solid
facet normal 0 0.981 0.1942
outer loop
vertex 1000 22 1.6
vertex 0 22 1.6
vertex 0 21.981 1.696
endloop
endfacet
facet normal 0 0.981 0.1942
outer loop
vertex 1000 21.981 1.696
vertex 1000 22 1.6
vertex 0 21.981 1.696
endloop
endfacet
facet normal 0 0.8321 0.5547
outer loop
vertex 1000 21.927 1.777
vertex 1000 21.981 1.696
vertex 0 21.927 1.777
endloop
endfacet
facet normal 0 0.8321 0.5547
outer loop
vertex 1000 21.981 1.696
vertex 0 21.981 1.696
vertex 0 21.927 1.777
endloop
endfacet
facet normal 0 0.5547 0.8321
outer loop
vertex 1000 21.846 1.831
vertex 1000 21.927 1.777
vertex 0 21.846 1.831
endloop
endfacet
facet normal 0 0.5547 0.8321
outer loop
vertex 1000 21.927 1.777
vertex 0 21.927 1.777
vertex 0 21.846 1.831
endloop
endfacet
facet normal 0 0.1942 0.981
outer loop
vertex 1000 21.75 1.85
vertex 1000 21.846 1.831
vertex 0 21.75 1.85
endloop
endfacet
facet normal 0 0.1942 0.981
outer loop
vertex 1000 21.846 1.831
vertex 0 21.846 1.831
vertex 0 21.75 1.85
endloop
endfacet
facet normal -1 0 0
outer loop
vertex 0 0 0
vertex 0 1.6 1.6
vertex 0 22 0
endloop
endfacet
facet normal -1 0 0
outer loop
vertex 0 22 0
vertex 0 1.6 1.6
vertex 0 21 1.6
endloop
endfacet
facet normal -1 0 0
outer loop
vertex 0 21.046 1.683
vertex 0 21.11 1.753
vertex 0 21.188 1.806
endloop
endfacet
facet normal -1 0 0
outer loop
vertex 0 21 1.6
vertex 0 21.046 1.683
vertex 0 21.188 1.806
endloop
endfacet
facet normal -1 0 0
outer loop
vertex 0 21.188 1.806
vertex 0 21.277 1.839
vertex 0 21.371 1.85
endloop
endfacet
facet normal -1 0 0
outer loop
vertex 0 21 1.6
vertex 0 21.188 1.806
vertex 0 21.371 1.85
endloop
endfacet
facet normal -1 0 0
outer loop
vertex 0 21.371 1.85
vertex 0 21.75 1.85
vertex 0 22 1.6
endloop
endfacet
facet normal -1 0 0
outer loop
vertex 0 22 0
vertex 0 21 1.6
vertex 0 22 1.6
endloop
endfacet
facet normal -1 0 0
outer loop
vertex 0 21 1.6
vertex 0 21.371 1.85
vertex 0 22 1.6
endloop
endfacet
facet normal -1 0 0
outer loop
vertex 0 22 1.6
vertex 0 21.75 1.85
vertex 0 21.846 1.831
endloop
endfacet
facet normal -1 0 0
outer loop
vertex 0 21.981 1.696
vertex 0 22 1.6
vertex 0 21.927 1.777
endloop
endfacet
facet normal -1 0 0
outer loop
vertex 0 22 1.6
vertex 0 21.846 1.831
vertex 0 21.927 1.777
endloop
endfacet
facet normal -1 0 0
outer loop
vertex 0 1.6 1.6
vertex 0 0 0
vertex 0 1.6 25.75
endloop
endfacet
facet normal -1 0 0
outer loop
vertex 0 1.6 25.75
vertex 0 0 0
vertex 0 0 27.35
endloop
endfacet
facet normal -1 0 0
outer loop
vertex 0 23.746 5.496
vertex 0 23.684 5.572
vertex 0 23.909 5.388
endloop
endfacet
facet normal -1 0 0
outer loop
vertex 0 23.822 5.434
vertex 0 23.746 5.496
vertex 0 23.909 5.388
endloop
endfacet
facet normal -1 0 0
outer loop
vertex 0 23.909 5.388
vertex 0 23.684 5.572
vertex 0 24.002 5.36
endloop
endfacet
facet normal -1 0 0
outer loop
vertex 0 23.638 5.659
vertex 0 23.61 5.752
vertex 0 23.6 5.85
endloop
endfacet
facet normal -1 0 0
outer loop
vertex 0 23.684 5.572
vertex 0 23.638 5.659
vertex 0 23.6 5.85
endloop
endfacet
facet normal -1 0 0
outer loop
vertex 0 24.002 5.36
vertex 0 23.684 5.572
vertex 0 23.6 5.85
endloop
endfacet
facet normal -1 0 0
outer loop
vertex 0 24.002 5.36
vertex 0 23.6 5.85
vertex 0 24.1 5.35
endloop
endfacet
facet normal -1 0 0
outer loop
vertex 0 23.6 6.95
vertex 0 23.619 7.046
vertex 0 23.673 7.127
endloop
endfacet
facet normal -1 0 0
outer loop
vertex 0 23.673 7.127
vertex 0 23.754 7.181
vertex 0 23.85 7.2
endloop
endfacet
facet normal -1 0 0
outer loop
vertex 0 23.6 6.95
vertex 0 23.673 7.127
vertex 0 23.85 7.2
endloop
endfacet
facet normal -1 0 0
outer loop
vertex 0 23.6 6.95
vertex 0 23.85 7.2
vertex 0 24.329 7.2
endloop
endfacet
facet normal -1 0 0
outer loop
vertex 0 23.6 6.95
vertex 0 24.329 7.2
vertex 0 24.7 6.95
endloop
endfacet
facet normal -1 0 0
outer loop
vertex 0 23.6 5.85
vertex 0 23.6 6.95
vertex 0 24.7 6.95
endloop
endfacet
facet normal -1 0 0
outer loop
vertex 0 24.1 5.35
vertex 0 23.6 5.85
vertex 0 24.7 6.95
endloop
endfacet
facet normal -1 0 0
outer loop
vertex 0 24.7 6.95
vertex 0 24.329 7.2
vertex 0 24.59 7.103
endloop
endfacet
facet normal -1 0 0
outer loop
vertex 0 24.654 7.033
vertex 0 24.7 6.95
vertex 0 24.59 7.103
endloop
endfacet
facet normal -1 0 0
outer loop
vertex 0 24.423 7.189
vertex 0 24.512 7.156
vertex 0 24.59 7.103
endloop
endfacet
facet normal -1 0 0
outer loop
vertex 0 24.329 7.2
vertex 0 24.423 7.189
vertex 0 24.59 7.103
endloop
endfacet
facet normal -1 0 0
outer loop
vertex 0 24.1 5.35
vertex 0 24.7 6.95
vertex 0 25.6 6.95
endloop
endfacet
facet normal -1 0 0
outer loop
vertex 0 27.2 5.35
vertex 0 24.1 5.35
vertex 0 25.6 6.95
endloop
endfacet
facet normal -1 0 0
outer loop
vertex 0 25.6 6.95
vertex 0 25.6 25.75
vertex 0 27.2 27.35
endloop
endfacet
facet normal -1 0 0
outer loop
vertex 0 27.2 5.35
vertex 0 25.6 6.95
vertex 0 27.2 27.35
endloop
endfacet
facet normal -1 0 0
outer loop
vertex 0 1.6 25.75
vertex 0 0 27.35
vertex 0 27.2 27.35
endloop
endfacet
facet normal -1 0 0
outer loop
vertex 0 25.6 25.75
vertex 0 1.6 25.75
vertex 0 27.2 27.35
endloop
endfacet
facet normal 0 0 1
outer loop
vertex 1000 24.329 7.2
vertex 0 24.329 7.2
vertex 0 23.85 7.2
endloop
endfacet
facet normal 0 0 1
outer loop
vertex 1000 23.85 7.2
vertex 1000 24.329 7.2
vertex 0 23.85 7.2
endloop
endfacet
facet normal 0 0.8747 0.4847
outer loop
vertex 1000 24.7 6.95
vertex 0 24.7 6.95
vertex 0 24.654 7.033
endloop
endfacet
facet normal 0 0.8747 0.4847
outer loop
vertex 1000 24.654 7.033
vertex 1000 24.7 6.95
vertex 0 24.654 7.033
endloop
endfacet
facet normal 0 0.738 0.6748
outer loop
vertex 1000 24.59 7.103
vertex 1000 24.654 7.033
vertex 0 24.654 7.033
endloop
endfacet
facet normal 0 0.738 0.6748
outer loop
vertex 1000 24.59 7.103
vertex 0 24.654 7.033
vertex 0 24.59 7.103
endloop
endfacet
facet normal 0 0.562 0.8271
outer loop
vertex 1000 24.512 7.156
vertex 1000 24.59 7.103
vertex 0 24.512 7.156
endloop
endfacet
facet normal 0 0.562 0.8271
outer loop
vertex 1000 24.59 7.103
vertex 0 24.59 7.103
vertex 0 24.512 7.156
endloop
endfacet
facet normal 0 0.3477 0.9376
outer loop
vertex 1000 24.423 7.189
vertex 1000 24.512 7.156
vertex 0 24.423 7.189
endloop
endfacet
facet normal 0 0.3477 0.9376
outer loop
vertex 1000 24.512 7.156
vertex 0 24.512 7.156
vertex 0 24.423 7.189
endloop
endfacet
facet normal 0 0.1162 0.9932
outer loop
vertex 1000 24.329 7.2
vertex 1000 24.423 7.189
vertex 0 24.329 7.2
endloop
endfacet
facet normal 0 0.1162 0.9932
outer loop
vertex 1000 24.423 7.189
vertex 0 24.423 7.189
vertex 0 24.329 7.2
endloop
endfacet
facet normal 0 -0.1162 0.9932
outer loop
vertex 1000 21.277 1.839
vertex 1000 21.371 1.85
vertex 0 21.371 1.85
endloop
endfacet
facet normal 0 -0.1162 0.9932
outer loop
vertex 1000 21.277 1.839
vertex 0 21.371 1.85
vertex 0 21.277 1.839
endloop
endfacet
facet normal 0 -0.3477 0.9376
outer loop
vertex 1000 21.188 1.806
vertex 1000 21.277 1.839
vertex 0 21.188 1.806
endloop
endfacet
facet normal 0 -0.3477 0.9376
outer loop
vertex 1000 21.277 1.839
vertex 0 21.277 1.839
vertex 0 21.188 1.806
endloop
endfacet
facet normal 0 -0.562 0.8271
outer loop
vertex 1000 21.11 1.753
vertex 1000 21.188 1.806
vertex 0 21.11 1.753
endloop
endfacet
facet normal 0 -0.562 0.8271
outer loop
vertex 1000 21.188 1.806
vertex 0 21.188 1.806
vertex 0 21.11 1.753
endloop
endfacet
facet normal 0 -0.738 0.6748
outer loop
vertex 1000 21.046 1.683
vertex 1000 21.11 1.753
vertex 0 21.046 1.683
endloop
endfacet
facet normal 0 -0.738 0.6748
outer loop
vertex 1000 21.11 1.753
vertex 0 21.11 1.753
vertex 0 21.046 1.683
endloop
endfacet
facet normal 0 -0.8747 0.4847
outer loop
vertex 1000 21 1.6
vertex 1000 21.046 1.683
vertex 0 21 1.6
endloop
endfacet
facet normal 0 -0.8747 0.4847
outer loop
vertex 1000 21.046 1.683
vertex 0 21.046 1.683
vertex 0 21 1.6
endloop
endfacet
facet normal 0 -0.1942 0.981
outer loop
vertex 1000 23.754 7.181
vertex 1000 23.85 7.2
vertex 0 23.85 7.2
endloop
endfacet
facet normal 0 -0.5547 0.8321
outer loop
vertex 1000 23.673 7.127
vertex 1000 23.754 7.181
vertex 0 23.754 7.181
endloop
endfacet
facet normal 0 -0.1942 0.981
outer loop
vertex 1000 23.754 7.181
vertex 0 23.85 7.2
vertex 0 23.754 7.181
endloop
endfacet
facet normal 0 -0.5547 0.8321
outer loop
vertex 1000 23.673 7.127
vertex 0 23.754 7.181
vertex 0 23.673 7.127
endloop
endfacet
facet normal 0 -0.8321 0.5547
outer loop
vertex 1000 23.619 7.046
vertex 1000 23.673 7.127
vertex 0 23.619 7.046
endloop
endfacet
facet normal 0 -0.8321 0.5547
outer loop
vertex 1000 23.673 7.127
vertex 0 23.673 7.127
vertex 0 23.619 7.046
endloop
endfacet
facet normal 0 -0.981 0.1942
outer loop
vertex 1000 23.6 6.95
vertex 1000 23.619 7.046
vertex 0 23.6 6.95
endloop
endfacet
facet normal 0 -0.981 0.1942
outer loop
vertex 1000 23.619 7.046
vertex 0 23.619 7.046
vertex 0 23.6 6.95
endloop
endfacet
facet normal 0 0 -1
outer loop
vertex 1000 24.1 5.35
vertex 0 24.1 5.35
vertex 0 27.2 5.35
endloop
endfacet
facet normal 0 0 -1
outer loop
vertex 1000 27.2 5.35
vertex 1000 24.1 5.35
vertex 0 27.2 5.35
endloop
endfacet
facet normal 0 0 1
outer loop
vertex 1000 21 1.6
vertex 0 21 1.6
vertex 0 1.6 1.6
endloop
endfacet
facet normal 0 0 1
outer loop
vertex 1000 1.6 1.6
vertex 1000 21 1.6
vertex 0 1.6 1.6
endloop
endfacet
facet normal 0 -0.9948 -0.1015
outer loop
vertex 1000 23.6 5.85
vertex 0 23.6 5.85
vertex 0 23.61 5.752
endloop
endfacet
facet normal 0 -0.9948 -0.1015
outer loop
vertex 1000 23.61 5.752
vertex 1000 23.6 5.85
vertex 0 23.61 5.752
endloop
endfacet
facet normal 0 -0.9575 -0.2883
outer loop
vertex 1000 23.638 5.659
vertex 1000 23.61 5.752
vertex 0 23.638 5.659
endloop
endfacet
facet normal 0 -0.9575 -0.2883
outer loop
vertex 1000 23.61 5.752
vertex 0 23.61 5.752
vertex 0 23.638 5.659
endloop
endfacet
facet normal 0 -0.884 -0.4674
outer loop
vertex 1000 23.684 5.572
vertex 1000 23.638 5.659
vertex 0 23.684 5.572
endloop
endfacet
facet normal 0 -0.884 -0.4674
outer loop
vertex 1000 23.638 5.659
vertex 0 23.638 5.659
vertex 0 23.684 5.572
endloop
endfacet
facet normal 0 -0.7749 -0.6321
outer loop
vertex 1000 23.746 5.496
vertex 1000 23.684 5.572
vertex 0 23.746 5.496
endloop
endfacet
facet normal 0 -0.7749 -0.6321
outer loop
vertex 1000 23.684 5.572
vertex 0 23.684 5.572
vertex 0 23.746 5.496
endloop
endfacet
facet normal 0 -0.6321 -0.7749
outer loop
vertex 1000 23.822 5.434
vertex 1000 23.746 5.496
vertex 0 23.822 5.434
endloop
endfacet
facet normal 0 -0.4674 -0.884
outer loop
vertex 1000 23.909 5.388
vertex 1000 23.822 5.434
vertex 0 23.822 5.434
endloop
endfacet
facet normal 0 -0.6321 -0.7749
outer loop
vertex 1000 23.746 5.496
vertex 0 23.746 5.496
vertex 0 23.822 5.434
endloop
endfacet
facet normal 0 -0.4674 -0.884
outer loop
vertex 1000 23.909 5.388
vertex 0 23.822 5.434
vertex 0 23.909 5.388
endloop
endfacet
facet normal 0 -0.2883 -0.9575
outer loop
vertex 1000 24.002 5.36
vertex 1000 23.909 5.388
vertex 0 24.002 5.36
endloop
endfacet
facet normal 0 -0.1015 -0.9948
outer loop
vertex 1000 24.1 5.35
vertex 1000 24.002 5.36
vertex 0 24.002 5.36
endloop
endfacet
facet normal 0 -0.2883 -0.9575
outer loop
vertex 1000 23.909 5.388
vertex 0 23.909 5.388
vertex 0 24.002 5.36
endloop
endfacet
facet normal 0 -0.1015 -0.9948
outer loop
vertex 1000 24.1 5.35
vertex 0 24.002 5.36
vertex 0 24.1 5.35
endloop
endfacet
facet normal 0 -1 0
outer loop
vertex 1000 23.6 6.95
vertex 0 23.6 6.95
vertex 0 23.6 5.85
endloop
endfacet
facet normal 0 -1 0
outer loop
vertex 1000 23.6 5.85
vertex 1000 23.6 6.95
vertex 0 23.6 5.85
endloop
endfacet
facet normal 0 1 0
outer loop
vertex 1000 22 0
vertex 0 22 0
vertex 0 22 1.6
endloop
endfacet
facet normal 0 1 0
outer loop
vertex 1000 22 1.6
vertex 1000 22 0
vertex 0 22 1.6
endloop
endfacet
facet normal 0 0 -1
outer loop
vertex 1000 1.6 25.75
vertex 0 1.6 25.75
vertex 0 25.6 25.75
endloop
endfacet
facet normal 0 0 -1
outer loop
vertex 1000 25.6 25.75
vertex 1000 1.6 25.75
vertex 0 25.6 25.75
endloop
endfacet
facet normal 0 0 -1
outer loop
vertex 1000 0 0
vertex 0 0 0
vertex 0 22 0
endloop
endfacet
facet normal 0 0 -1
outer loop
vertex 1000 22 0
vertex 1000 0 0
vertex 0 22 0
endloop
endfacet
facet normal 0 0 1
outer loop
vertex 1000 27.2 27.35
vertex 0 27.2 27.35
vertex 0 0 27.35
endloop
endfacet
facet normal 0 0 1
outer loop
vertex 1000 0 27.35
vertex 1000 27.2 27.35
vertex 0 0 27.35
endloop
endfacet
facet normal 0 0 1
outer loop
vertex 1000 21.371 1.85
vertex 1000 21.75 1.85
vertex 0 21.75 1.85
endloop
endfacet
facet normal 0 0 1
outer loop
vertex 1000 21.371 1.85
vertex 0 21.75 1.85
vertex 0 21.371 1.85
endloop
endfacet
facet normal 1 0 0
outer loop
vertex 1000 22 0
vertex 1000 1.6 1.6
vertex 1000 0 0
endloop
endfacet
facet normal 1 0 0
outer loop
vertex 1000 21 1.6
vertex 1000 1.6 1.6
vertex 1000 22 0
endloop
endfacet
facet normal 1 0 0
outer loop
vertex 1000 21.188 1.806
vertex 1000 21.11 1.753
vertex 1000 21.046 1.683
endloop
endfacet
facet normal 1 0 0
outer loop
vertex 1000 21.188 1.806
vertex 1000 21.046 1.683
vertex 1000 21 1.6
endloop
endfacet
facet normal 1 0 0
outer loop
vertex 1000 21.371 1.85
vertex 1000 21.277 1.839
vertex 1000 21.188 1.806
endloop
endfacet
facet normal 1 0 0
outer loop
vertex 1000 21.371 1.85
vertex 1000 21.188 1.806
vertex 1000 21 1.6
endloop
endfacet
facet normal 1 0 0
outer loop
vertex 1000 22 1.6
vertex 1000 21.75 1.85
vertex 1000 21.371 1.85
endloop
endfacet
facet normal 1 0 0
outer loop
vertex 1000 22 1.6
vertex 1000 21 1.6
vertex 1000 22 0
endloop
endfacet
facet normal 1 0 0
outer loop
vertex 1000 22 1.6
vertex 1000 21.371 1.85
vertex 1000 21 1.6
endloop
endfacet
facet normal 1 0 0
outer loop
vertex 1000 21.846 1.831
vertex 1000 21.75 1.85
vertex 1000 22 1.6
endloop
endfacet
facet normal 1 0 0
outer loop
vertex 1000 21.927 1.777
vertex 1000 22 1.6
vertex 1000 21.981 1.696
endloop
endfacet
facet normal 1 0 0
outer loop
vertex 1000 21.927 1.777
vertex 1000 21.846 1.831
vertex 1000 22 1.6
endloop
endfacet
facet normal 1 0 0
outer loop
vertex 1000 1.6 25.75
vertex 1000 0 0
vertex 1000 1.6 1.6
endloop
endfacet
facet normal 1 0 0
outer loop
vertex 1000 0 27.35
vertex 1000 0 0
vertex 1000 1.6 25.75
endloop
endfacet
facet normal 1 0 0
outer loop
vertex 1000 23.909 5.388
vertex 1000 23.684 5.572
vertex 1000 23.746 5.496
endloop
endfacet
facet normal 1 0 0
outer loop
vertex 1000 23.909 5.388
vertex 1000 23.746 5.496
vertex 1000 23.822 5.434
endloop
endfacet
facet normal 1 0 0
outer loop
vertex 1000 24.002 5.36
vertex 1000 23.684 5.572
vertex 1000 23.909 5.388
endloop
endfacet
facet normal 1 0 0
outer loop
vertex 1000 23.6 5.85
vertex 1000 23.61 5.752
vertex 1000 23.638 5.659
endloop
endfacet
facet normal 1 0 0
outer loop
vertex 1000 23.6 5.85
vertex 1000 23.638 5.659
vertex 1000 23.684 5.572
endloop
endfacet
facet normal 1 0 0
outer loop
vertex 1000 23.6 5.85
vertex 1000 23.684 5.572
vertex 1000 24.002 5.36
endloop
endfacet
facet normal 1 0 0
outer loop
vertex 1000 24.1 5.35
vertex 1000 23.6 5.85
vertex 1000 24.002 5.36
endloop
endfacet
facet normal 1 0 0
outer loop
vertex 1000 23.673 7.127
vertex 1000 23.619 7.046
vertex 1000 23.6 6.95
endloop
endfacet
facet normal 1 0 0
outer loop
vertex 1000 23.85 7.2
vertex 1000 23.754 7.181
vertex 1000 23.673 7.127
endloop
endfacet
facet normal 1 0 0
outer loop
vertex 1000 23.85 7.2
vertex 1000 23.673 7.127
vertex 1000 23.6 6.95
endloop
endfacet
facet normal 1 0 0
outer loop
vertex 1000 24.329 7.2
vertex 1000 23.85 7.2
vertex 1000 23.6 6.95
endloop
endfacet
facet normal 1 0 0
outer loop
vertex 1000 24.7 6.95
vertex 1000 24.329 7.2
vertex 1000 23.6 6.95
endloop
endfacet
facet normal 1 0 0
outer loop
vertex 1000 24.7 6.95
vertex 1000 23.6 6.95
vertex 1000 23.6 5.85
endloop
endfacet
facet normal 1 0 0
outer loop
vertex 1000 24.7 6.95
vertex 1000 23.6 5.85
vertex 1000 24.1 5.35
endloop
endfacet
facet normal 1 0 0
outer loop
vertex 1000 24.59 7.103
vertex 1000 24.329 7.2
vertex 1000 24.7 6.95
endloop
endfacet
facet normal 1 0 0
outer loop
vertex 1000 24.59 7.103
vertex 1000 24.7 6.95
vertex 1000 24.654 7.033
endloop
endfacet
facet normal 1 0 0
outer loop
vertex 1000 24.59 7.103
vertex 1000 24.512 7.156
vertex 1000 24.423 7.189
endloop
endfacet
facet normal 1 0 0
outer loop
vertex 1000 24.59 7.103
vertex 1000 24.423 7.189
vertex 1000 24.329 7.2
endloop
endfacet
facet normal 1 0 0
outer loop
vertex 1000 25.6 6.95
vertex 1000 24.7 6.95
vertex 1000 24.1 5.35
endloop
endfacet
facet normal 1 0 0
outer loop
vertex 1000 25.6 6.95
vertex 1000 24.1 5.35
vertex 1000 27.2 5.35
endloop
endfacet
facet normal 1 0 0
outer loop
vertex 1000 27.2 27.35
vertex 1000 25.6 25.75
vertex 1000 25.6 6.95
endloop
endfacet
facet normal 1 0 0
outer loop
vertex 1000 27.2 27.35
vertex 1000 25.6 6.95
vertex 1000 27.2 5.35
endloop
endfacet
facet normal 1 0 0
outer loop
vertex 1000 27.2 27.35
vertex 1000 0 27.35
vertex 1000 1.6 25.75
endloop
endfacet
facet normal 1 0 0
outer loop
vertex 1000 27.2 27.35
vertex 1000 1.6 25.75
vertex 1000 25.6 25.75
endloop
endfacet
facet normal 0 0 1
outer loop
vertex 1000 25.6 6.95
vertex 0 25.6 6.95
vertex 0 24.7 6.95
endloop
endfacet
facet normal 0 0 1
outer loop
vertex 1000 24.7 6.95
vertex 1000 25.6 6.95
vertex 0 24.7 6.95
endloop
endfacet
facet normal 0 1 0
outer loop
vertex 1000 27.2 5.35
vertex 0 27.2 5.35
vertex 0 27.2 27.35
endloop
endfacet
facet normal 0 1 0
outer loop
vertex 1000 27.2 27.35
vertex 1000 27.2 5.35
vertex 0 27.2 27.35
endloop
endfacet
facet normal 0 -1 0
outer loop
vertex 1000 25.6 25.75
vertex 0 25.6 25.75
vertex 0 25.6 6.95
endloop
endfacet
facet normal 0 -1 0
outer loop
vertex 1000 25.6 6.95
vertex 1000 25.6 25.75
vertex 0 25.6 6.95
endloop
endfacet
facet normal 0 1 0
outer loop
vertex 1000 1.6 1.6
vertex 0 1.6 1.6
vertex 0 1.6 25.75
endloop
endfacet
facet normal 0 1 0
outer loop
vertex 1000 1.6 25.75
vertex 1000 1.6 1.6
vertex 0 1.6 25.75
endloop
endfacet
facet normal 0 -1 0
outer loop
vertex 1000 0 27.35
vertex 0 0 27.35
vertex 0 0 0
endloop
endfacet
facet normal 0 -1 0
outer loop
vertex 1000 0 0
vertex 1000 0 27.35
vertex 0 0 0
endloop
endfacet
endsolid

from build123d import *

# Parameters (mm, degrees)
F1_DEPTH = 1000


with BuildPart() as f1:
    # F0 (on Right) → F1 (new body)
    with BuildSketch(Plane.YZ):
        with BuildLine():
            Line((27.2, 5.35), (27.2, 27.35))
            Line((27.2, 27.35), (0, 27.35))
            Line((0, 27.35), (0, 0))
            Line((0, 0), (22, 0))
            Line((22, 0), (22, 1.6))
            ThreePointArc((22, 1.6), (21.926777, 1.776777), (21.75, 1.85))
            Line((21.75, 1.85), (21.37081, 1.85))
            ThreePointArc((21.37081, 1.85), (21.147203, 1.781662), (21, 1.6))
            Line((21, 1.6), (1.6, 1.6))
            Line((1.6, 1.6), (1.6, 13.675))
            Line((1.6, 13.675), (1.6, 25.75))
            Line((1.6, 25.75), (25.6, 25.75))
            Line((25.6, 25.75), (25.6, 6.95))
            Line((25.6, 6.95), (24.7, 6.95))
            ThreePointArc((24.7, 6.95), (24.552797, 7.131662), (24.32919, 7.2))
            Line((24.32919, 7.2), (23.85, 7.2))
            ThreePointArc((23.85, 7.2), (23.673223, 7.126777), (23.6, 6.95))
            Line((23.6, 6.95), (23.6, 5.85))
            ThreePointArc((23.6, 5.85), (23.746447, 5.496447), (24.1, 5.35))
            Line((24.1, 5.35), (27.2, 5.35))
        make_face()
    extrude(amount=F1_DEPTH)


solid = f1.part
